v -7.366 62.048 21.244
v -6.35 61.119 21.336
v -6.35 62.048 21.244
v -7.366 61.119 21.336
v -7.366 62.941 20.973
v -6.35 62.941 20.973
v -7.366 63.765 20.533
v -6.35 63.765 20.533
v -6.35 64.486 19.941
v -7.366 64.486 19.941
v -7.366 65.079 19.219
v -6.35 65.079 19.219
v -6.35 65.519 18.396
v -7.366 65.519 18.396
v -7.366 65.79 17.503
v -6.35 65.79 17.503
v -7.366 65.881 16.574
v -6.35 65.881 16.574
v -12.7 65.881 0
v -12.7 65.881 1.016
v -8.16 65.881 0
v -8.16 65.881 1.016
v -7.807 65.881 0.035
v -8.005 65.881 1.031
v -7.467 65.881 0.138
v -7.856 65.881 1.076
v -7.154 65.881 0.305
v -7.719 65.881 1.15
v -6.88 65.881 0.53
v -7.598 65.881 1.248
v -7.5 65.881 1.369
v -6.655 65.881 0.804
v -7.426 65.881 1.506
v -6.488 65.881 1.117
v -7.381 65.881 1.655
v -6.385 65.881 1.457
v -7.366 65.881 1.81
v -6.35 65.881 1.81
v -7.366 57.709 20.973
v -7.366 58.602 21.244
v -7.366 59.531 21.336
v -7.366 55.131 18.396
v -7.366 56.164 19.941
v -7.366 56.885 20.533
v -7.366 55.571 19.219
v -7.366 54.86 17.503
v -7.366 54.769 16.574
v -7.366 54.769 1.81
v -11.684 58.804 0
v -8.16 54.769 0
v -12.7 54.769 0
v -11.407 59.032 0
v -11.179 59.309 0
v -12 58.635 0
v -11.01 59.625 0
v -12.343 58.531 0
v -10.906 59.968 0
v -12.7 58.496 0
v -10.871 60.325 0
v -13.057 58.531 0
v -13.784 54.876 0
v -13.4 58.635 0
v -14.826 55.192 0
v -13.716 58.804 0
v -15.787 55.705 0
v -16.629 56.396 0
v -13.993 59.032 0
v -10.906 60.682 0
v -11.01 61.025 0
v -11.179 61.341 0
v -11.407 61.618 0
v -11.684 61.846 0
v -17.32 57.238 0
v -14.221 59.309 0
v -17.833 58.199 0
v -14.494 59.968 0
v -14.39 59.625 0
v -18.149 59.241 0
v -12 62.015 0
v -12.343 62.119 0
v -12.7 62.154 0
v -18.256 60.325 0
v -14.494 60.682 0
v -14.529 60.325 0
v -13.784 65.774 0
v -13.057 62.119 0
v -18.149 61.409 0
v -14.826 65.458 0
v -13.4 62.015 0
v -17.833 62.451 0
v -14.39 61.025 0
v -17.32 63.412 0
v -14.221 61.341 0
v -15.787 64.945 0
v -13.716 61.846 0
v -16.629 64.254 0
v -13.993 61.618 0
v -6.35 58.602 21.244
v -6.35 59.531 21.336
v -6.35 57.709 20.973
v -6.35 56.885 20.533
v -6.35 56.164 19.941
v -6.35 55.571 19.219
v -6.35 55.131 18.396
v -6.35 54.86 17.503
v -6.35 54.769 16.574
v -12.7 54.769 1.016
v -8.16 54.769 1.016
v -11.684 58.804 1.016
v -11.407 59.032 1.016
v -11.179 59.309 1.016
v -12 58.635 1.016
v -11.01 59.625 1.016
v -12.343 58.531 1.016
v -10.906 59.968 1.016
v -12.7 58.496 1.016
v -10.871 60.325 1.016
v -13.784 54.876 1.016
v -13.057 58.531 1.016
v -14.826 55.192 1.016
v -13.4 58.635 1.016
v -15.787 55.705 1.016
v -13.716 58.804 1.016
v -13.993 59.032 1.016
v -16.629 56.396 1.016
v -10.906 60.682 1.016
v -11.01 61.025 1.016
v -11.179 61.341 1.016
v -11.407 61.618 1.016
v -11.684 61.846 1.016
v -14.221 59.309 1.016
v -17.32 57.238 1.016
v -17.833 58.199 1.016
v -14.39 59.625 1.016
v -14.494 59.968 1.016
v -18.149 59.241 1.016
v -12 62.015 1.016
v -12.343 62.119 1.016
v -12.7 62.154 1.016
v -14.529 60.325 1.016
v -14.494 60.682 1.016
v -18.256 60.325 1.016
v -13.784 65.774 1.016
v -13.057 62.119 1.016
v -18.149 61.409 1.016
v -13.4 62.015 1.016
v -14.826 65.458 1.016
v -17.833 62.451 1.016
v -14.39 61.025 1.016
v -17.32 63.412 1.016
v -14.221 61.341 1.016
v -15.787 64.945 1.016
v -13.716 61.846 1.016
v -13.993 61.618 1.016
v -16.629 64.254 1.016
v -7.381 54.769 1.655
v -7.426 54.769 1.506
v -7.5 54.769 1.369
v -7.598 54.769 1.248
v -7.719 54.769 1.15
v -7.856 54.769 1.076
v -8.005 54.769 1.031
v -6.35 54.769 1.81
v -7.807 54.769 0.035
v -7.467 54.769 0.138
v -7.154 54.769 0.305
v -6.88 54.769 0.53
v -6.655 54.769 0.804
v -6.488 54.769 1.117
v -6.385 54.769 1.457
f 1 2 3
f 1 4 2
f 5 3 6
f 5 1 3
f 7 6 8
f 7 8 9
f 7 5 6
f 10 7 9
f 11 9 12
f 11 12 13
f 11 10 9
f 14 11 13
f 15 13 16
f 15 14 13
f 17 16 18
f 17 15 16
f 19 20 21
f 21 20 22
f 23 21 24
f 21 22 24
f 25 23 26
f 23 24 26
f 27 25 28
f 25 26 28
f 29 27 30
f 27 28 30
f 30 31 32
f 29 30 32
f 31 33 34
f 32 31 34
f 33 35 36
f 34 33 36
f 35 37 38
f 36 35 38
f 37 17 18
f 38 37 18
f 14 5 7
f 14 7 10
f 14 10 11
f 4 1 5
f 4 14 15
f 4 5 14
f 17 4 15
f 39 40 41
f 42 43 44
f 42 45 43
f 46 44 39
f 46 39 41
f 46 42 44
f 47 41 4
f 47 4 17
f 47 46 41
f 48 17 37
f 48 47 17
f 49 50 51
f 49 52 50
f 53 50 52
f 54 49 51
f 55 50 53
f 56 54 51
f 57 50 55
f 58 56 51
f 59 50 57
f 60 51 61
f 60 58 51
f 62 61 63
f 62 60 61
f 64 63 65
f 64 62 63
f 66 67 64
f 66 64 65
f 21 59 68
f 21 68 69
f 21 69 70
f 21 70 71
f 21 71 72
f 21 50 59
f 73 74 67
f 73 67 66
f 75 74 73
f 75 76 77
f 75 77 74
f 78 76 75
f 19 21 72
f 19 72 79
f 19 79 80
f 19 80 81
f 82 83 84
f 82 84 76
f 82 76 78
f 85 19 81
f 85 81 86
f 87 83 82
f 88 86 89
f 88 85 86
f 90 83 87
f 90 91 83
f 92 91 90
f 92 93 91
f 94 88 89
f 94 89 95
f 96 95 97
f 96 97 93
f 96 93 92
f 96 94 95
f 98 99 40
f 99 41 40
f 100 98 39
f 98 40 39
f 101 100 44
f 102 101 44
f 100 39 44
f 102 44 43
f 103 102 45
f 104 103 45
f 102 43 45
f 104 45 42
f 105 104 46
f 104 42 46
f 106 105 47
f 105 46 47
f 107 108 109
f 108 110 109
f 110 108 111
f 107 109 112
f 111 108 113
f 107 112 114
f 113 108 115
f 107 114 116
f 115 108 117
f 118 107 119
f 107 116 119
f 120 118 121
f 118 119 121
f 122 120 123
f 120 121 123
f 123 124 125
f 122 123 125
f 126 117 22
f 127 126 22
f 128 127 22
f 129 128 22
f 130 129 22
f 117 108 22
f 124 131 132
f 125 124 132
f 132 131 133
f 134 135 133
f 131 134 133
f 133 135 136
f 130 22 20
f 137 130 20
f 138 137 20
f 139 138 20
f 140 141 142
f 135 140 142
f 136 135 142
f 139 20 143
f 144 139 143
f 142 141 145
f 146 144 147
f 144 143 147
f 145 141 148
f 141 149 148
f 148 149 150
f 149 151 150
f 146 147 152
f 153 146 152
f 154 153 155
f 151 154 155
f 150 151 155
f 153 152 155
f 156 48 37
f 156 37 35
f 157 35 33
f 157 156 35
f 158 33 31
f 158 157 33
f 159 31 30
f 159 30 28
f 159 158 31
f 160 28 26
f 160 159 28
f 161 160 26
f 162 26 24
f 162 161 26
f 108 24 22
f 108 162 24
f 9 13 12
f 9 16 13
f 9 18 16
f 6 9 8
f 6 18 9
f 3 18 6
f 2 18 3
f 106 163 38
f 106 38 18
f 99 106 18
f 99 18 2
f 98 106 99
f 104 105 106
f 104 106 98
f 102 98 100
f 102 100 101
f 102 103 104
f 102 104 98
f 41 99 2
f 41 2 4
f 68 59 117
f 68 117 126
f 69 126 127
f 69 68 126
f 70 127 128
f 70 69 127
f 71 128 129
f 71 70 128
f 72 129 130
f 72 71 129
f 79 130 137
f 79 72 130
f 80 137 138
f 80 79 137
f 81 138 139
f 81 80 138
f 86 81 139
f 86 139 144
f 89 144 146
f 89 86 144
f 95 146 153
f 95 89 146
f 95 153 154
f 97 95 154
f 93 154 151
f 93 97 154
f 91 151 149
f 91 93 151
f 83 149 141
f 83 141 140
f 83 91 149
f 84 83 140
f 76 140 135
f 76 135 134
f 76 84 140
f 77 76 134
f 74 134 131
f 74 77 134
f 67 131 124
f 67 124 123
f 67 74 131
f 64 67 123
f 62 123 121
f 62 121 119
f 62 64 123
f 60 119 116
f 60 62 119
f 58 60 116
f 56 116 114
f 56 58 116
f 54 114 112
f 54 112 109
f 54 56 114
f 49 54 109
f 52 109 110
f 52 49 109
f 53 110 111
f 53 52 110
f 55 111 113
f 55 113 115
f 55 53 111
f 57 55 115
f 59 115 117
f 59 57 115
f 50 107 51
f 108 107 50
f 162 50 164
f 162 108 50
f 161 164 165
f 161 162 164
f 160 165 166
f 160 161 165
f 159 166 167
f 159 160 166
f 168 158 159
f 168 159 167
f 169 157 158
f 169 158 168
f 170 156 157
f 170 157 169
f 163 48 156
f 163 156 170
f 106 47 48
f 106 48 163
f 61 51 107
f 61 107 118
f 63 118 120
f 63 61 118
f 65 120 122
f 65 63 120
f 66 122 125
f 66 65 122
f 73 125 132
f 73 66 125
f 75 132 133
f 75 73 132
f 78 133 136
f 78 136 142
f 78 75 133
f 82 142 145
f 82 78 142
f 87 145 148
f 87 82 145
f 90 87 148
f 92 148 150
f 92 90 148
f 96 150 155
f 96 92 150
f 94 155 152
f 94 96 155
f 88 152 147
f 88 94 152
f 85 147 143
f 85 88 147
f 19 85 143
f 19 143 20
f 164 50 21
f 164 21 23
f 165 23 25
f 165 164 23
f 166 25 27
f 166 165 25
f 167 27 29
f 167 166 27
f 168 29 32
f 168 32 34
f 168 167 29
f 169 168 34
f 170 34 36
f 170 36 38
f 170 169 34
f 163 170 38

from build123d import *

# Parameters (mm, degrees)
SKETCH1_R                    = 1.8288
BASE_FLANGE1_DEPTH           = 1.016
EDGE_FLANGE1_STRIP_W         = 5.6515
EDGE_FLANGE1_STRIP_H         = 1.016
EDGE_FLANGE1_STRIP_CUT_DEPTH = 11.1125
EDGE_FLANGE1_DEPTH           = 11.1125
FILLET1_R                    = 4.7625


# Sheet-metal steps are written as plain solids
with BuildPart() as part:
    # Sketch1 → Base-Flange1 (new body)
    with BuildSketch(Plane.XY):
        with BuildLine():
            Line((-12.7, 65.88125), (-6.35, 65.88125))
            Line((-6.35, 65.88125), (-6.35, 54.76875))
            Line((-6.35, 54.76875), (-12.7, 54.76875))
            ThreePointArc((-12.7, 54.76875), (-18.25625, 60.325), (-12.7, 65.88125))
        make_face()
        with Locations((-12.7, 60.325)):
            Circle(SKETCH1_R, mode=Mode.SUBTRACT)
    extrude(amount=BASE_FLANGE1_DEPTH)

    # Edge-Flange1 strip (across the edge) → Edge-Flange1 strip cut (cut)
    with BuildSketch(Plane(origin=(-6.35, 54.76875, 1.016), x_dir=(-1, 0, 0), z_dir=(0, 1, 0))):
        with Locations((-1.016, -0.508)):
            Rectangle(EDGE_FLANGE1_STRIP_W, EDGE_FLANGE1_STRIP_H)
    extrude(amount=EDGE_FLANGE1_STRIP_CUT_DEPTH, mode=Mode.SUBTRACT)

    # Edge-Flange1 section (across the edge) → Edge-Flange1 (add)
    with BuildSketch(Plane(origin=(-6.35, 54.76875, 1.016), x_dir=(-1, 0, 0), z_dir=(0, 1, 0))):
        with BuildLine():
            Line((0, 0.79375), (0, 20.32))
            Line((0, 20.32), (1.016, 20.32))
            Line((1.016, 20.32), (1.016, 0.79375))
            ThreePointArc((1.016, 0.79375), (1.248483992, 0.232483992), (1.80975, 0))
            Line((1.80975, 0), (1.80975, -1.016))
            ThreePointArc((1.80975, -1.016), (0.530063503, -0.485936497), (0, 0.79375))
        make_face()
    extrude(amount=EDGE_FLANGE1_DEPTH)

    # Fillet1
    fillet1_edges = [part.edges().sort_by_distance(p)[0] for p in [
        (-6.858, 54.76875, 21.336),
        (-6.858, 65.88125, 21.336),
    ]]
    fillet(fillet1_edges, radius=FILLET1_R)


solid = part.part
